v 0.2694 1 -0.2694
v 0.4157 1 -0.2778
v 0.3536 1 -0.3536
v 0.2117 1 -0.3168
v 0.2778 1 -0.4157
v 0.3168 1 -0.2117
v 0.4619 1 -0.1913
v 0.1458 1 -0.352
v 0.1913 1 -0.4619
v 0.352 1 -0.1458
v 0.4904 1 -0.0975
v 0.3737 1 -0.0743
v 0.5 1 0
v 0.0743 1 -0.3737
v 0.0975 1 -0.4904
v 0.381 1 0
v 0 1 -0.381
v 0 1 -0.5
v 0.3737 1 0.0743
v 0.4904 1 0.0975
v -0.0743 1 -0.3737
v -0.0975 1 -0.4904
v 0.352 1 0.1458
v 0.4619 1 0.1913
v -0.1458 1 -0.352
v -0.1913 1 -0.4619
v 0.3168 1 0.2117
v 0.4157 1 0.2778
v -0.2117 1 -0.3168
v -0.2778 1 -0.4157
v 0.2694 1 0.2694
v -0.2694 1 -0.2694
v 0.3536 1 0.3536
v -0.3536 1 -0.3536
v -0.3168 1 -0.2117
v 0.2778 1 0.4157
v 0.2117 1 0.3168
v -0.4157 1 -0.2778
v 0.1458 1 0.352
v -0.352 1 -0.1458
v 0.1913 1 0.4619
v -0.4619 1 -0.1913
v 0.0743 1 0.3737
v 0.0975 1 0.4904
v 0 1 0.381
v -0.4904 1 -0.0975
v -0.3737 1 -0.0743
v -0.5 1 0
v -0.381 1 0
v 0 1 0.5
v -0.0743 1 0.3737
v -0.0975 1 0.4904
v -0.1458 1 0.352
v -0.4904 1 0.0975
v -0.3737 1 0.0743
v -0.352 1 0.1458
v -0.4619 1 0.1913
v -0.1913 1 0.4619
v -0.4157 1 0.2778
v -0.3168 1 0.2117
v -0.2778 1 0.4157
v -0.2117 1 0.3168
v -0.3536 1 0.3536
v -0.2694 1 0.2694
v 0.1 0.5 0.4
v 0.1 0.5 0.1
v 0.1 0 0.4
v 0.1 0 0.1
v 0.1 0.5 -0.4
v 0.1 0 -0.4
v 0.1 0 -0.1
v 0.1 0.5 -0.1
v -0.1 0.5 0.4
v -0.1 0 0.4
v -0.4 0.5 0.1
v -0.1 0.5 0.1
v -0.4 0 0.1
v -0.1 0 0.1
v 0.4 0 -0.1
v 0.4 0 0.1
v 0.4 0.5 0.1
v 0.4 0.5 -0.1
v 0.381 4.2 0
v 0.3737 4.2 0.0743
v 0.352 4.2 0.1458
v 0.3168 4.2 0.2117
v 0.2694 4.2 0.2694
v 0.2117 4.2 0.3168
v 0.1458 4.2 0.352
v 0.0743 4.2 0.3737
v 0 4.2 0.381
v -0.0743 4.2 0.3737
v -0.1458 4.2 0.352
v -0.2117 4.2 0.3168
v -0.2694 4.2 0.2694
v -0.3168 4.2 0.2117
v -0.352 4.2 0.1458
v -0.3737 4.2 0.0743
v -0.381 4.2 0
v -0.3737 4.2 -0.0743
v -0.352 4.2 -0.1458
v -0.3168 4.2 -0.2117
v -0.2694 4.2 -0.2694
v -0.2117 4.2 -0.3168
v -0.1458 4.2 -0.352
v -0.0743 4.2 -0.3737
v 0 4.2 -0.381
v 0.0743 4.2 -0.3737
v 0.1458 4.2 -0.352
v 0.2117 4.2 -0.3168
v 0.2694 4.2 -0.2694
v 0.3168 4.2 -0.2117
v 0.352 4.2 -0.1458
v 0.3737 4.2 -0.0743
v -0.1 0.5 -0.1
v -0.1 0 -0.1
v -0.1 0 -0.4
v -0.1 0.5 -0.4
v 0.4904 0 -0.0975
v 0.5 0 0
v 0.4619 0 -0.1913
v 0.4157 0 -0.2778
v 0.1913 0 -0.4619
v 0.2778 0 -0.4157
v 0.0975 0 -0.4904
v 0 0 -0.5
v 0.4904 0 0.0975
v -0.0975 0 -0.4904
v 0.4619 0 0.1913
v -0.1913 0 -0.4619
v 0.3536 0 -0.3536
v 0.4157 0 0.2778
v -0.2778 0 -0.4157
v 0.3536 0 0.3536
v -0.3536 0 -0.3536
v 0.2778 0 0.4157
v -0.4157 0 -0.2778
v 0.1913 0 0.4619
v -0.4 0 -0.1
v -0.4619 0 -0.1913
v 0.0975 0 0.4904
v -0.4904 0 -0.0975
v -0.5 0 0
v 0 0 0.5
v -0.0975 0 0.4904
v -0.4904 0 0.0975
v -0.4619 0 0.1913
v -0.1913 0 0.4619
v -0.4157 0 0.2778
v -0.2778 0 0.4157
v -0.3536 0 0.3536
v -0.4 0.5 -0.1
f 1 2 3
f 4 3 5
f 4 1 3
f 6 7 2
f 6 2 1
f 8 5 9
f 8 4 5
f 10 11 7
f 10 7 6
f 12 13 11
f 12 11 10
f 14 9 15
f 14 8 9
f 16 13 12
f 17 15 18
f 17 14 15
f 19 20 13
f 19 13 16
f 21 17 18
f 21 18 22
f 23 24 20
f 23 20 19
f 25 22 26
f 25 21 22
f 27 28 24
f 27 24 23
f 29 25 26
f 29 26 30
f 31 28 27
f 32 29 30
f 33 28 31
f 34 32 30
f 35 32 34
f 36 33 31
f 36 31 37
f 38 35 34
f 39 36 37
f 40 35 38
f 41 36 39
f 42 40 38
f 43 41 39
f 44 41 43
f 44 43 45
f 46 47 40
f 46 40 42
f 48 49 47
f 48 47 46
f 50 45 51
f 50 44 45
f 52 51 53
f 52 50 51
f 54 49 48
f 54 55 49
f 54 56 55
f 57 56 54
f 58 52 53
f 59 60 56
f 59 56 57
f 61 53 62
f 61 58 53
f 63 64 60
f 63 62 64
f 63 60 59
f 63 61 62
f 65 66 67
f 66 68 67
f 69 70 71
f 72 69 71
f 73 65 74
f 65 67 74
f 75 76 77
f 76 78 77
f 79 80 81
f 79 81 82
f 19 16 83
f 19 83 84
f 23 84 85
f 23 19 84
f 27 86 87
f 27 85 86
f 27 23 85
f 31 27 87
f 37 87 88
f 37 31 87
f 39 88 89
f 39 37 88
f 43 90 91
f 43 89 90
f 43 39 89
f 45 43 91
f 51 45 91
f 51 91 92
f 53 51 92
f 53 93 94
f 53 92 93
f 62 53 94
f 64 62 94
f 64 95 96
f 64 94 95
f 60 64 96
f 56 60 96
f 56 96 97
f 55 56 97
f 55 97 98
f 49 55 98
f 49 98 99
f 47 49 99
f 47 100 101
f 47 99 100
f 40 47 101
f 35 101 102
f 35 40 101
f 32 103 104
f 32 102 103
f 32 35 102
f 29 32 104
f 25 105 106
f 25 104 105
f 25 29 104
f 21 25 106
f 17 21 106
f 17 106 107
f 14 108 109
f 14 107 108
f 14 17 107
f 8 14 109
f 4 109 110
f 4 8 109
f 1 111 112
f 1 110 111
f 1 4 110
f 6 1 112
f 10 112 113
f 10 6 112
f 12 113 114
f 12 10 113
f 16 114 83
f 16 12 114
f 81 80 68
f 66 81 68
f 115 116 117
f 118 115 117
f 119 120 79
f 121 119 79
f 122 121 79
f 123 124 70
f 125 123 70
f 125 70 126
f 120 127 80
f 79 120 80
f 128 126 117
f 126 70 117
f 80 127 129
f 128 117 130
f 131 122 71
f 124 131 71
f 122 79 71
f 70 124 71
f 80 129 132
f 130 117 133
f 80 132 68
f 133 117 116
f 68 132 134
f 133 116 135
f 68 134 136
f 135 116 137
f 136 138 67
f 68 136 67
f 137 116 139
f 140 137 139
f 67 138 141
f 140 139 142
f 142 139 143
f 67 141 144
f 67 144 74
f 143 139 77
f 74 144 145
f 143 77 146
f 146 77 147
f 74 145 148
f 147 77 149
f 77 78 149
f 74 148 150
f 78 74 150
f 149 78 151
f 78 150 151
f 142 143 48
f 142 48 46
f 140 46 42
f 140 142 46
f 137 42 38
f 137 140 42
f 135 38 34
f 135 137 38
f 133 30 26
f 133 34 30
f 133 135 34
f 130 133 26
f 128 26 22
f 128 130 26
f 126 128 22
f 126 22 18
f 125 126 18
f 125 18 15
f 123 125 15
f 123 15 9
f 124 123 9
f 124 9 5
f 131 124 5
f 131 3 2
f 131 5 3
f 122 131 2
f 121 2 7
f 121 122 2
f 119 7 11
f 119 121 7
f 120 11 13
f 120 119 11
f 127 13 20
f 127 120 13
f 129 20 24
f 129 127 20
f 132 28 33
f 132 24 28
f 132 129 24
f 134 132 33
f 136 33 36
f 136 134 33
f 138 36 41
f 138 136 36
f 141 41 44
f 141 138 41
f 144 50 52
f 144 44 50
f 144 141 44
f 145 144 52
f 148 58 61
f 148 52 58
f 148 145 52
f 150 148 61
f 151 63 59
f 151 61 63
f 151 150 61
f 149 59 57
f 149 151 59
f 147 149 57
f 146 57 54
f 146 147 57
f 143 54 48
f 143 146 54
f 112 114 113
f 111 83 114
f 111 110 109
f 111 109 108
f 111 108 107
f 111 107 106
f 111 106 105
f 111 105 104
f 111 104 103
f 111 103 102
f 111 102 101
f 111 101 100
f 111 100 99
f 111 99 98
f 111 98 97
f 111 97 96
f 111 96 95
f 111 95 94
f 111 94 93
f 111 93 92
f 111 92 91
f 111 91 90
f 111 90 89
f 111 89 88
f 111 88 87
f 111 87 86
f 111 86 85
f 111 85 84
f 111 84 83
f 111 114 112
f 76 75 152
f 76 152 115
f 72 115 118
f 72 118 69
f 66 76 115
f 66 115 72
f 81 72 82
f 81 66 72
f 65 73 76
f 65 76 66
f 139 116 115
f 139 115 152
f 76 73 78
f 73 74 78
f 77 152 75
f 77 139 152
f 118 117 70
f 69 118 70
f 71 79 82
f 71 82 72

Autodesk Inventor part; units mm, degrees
ref_plane "YZ Plane" through (0, 0, 0) normal (1, 0, 0) x (0, 1, 0)
ref_plane "XZ Plane" through (0, 0, 0) normal (0, 1, 0) x (-1, 0, 0)
ref_plane "XY Plane" through (0, 0, 0) normal (0, 0, 1) x (1, 0, 0)
sketch "Sketch1" plane through (0, 0, 0) normal (0, 1, 0) x (-1, 0, 0)
  circle A0 centre (0, 0) radius 0.5
  dimension "d0" = 1
extrude "Extrusion1" add sketch "Sketch1" along normal blind 1
sketch "Sketch2" plane through (0, 1, 0) normal (0, 1, 0) x (1, 0, 0)
  circle A0 centre (0, 0) radius 0.381
  dimension "d3" = 0.762
extrude "Extrusion2" add sketch "Sketch2" along normal blind 3.2
sketch "Sketch3" plane through (0, 0, 0) normal (0, -1, 0) x (1, 0, 0)
  line L0 (0.4, 0) -> (0.4, -0.1)
  line L1 (-0.4, -0.1) -> (-0.4, 0)
  line L2 (0.4, 0) -> (0.4, 0.1)
  line L3 (-0.4, 0.1) -> (-0.4, 0)
  line L4 (0, -0.4) -> (0.1, -0.4)
  line L5 (0.1, 0.4) -> (-0.1, 0.4)
  line L6 (-0.1, -0.4) -> (0, -0.4)
  line L7 (-0.1, 0.4) -> (-0.1, 0.1)
  line L8 (-0.1, -0.1) -> (-0.1, -0.4)
  line L9 (0.4, 0.1) -> (0.1, 0.1)
  line L10 (-0.1, 0.1) -> (-0.4, 0.1)
  line L11 (0.1, -0.4) -> (0.1, -0.1)
  line L12 (0.1, 0.1) -> (0.1, 0.4)
  line L13 (0.4, -0.1) -> (0.1, -0.1)
  line L14 (-0.1, -0.1) -> (-0.4, -0.1)
  point P0 (0, 0)
  dimension "d7" = 0.8
  dimension "d8" = 0.1
  dimension "d9" = 0.8
  dimension "d10" = 0.1
  dimension "d11" = 0.1
  dimension "d12" = 0.8
  dimension "d13" = 0.2
  dimension "d14" = 0.8
extrude "Extrusion3" cut sketch "Sketch3" against normal blind 0.5
properties part number "armscrew1" material "Iron, Gray"
